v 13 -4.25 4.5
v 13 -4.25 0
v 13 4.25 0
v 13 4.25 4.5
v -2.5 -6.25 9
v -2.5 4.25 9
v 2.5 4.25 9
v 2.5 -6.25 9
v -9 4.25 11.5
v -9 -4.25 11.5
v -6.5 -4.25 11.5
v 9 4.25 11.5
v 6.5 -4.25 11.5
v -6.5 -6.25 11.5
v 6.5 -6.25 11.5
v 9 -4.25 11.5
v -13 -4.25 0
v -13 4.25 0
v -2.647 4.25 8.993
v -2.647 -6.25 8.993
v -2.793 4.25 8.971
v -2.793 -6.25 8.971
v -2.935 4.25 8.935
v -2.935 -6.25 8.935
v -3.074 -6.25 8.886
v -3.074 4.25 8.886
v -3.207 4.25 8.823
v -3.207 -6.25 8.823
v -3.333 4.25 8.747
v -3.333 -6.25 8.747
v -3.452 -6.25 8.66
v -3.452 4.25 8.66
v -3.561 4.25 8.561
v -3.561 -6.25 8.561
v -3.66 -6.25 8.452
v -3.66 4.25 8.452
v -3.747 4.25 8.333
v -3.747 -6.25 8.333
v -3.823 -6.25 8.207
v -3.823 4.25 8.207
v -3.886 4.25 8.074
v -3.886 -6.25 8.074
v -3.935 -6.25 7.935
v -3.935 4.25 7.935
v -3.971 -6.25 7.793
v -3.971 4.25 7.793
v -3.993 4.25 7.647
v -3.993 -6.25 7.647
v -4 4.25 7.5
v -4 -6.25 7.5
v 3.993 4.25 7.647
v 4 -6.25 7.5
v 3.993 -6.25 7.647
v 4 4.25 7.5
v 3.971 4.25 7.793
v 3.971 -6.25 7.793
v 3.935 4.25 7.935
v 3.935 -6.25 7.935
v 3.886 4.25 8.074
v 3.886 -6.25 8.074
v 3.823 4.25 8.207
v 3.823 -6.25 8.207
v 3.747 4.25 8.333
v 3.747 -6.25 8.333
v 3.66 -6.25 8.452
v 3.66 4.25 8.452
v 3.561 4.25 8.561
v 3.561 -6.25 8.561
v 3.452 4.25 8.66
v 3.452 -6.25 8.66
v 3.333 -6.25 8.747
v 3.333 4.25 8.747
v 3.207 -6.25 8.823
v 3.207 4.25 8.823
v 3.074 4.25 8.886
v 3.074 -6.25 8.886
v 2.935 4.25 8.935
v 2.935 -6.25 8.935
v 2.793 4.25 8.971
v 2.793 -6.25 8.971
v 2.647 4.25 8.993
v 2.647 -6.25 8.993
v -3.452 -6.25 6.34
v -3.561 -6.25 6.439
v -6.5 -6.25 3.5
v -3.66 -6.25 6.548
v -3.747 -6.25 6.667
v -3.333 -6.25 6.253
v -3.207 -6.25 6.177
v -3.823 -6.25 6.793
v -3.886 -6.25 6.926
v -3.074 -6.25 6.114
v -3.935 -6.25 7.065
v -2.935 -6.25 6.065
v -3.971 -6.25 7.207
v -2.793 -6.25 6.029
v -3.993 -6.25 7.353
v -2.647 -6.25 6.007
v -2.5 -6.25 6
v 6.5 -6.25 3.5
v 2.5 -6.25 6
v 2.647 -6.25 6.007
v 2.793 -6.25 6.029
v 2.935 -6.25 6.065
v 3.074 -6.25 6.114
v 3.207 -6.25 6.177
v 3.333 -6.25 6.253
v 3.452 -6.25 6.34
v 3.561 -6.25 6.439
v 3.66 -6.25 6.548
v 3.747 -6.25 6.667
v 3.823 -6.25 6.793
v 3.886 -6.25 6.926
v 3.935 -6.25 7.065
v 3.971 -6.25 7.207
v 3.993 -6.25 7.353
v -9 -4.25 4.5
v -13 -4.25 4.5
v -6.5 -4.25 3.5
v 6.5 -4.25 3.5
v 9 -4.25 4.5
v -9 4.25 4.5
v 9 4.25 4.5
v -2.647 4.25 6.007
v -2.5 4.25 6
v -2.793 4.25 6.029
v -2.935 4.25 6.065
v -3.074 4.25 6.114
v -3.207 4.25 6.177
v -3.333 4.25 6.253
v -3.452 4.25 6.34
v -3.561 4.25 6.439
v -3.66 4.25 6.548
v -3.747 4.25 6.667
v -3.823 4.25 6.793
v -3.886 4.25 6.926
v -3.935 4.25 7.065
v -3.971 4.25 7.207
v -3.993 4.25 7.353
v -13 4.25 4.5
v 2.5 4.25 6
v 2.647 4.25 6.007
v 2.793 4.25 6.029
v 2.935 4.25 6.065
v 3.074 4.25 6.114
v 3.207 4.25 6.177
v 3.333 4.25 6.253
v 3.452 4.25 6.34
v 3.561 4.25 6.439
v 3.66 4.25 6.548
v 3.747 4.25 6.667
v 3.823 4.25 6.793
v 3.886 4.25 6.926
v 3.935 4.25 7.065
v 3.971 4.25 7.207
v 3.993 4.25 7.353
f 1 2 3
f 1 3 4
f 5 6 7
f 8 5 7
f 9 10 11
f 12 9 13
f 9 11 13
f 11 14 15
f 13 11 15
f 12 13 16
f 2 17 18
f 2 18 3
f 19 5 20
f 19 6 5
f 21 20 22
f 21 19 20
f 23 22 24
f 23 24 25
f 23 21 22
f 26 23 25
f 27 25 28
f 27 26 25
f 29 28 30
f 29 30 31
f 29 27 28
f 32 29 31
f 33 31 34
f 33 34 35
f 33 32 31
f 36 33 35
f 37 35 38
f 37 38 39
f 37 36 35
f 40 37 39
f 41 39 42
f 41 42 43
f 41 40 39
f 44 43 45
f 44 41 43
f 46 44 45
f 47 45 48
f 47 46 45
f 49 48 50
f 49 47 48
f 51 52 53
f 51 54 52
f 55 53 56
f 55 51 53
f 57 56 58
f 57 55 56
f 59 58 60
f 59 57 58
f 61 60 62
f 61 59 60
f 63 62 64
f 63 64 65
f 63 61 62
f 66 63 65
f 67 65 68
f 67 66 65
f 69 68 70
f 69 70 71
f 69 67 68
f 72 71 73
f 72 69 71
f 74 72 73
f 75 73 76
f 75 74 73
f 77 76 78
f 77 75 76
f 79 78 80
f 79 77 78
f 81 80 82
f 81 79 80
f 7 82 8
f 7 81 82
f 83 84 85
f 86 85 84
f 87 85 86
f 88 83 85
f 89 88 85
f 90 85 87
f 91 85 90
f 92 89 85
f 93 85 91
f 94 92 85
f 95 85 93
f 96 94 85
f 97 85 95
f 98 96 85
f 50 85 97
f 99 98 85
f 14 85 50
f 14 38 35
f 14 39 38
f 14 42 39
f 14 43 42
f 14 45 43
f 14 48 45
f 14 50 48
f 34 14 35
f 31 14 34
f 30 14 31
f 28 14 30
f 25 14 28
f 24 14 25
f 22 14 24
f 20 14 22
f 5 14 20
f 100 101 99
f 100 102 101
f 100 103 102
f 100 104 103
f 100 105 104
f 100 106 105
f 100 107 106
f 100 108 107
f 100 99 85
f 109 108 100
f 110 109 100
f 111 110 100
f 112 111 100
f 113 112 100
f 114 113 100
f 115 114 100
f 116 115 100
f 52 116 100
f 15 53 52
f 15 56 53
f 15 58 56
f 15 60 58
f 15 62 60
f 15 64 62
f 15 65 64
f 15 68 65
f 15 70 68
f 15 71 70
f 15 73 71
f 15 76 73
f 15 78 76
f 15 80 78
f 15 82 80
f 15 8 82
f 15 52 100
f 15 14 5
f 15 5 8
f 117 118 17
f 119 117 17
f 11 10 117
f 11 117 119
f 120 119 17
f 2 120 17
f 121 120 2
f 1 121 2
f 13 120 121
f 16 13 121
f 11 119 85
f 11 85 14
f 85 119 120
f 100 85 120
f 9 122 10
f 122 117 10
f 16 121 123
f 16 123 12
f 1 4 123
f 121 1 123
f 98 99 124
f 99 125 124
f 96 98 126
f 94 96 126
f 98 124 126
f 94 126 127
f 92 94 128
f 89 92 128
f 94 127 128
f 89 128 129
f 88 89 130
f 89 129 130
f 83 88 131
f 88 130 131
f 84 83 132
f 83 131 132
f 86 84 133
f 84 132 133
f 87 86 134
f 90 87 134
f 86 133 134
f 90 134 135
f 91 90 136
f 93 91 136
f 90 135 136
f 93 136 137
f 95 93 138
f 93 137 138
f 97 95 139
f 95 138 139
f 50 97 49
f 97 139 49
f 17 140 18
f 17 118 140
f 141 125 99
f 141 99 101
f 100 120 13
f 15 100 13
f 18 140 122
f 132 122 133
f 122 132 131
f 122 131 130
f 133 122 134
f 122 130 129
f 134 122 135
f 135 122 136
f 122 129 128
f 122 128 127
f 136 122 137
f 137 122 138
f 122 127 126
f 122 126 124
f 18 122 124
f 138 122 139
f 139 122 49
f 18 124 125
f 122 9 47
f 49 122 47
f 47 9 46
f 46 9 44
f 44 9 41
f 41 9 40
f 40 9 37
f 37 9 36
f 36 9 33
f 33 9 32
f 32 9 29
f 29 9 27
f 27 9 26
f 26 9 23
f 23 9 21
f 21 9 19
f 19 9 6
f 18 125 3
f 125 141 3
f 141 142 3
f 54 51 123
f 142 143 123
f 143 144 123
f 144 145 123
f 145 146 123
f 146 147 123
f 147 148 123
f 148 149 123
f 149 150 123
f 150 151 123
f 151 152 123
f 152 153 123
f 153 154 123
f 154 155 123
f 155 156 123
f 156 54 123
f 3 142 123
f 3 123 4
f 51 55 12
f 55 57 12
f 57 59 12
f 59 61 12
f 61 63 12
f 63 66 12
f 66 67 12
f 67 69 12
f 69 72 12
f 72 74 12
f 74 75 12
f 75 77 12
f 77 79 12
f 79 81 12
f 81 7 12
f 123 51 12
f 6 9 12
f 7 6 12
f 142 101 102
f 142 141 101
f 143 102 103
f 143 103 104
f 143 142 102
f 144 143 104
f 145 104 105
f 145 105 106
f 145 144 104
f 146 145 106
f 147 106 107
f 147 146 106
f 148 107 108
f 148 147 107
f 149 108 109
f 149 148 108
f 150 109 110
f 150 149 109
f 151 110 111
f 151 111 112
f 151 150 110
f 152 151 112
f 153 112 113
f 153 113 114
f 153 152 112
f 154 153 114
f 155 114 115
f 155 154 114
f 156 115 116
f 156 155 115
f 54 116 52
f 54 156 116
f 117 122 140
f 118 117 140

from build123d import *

# Parameters (mm, degrees)
F0_W     = 18
F0_H     = 7
F1_DEPTH = 4.25
F2_W     = 13
F2_H     = 8
F3_DEPTH = 2
F4_W     = 8
F4_H     = 3
F5_DEPTH = 10.5
F6_R     = 1.49999


# Not quite as in the source:
# - a fillet or chamfer is up to 0.001 mm smaller than in the source, because OpenCascade refuses the exact size


with BuildPart() as f1:
    # F0 (on Front) → F1 (new body, symmetric)
    with BuildSketch(Plane.XZ):
        Polygon((-13, 4.5), (-13, 0), (13, 0), (13, 4.5), (9, 4.5), (-9, 4.5), align=None)
        with Locations((0, 8)):
            Rectangle(F0_W, F0_H)
    extrude(amount=F1_DEPTH, both=True)

    # F2 (on face) → F3 (join)
    with BuildSketch(Plane.XZ.offset(4.25)):
        with Locations((0, 7.5)):
            Rectangle(F2_W, F2_H)
    extrude(amount=F3_DEPTH)

    # F4 (on face) → F5 (cut, through all)
    with BuildSketch(Plane.XZ.offset(6.25)):
        with Locations((0, 7.5)):
            Rectangle(F4_W, F4_H)
    extrude(amount=-F5_DEPTH, mode=Mode.SUBTRACT)

    # F6 (radius 1.5 in the source; OpenCascade refuses exactly that, so slightly less here)
    f6_edges = [f1.edges().sort_by_distance(p)[0] for p in [
        (-4, -1, 6),
        (-4, -1, 9),
        (4, -1, 6),
        (4, -1, 9),
    ]]
    fillet(f6_edges, radius=F6_R)


solid = f1.part
